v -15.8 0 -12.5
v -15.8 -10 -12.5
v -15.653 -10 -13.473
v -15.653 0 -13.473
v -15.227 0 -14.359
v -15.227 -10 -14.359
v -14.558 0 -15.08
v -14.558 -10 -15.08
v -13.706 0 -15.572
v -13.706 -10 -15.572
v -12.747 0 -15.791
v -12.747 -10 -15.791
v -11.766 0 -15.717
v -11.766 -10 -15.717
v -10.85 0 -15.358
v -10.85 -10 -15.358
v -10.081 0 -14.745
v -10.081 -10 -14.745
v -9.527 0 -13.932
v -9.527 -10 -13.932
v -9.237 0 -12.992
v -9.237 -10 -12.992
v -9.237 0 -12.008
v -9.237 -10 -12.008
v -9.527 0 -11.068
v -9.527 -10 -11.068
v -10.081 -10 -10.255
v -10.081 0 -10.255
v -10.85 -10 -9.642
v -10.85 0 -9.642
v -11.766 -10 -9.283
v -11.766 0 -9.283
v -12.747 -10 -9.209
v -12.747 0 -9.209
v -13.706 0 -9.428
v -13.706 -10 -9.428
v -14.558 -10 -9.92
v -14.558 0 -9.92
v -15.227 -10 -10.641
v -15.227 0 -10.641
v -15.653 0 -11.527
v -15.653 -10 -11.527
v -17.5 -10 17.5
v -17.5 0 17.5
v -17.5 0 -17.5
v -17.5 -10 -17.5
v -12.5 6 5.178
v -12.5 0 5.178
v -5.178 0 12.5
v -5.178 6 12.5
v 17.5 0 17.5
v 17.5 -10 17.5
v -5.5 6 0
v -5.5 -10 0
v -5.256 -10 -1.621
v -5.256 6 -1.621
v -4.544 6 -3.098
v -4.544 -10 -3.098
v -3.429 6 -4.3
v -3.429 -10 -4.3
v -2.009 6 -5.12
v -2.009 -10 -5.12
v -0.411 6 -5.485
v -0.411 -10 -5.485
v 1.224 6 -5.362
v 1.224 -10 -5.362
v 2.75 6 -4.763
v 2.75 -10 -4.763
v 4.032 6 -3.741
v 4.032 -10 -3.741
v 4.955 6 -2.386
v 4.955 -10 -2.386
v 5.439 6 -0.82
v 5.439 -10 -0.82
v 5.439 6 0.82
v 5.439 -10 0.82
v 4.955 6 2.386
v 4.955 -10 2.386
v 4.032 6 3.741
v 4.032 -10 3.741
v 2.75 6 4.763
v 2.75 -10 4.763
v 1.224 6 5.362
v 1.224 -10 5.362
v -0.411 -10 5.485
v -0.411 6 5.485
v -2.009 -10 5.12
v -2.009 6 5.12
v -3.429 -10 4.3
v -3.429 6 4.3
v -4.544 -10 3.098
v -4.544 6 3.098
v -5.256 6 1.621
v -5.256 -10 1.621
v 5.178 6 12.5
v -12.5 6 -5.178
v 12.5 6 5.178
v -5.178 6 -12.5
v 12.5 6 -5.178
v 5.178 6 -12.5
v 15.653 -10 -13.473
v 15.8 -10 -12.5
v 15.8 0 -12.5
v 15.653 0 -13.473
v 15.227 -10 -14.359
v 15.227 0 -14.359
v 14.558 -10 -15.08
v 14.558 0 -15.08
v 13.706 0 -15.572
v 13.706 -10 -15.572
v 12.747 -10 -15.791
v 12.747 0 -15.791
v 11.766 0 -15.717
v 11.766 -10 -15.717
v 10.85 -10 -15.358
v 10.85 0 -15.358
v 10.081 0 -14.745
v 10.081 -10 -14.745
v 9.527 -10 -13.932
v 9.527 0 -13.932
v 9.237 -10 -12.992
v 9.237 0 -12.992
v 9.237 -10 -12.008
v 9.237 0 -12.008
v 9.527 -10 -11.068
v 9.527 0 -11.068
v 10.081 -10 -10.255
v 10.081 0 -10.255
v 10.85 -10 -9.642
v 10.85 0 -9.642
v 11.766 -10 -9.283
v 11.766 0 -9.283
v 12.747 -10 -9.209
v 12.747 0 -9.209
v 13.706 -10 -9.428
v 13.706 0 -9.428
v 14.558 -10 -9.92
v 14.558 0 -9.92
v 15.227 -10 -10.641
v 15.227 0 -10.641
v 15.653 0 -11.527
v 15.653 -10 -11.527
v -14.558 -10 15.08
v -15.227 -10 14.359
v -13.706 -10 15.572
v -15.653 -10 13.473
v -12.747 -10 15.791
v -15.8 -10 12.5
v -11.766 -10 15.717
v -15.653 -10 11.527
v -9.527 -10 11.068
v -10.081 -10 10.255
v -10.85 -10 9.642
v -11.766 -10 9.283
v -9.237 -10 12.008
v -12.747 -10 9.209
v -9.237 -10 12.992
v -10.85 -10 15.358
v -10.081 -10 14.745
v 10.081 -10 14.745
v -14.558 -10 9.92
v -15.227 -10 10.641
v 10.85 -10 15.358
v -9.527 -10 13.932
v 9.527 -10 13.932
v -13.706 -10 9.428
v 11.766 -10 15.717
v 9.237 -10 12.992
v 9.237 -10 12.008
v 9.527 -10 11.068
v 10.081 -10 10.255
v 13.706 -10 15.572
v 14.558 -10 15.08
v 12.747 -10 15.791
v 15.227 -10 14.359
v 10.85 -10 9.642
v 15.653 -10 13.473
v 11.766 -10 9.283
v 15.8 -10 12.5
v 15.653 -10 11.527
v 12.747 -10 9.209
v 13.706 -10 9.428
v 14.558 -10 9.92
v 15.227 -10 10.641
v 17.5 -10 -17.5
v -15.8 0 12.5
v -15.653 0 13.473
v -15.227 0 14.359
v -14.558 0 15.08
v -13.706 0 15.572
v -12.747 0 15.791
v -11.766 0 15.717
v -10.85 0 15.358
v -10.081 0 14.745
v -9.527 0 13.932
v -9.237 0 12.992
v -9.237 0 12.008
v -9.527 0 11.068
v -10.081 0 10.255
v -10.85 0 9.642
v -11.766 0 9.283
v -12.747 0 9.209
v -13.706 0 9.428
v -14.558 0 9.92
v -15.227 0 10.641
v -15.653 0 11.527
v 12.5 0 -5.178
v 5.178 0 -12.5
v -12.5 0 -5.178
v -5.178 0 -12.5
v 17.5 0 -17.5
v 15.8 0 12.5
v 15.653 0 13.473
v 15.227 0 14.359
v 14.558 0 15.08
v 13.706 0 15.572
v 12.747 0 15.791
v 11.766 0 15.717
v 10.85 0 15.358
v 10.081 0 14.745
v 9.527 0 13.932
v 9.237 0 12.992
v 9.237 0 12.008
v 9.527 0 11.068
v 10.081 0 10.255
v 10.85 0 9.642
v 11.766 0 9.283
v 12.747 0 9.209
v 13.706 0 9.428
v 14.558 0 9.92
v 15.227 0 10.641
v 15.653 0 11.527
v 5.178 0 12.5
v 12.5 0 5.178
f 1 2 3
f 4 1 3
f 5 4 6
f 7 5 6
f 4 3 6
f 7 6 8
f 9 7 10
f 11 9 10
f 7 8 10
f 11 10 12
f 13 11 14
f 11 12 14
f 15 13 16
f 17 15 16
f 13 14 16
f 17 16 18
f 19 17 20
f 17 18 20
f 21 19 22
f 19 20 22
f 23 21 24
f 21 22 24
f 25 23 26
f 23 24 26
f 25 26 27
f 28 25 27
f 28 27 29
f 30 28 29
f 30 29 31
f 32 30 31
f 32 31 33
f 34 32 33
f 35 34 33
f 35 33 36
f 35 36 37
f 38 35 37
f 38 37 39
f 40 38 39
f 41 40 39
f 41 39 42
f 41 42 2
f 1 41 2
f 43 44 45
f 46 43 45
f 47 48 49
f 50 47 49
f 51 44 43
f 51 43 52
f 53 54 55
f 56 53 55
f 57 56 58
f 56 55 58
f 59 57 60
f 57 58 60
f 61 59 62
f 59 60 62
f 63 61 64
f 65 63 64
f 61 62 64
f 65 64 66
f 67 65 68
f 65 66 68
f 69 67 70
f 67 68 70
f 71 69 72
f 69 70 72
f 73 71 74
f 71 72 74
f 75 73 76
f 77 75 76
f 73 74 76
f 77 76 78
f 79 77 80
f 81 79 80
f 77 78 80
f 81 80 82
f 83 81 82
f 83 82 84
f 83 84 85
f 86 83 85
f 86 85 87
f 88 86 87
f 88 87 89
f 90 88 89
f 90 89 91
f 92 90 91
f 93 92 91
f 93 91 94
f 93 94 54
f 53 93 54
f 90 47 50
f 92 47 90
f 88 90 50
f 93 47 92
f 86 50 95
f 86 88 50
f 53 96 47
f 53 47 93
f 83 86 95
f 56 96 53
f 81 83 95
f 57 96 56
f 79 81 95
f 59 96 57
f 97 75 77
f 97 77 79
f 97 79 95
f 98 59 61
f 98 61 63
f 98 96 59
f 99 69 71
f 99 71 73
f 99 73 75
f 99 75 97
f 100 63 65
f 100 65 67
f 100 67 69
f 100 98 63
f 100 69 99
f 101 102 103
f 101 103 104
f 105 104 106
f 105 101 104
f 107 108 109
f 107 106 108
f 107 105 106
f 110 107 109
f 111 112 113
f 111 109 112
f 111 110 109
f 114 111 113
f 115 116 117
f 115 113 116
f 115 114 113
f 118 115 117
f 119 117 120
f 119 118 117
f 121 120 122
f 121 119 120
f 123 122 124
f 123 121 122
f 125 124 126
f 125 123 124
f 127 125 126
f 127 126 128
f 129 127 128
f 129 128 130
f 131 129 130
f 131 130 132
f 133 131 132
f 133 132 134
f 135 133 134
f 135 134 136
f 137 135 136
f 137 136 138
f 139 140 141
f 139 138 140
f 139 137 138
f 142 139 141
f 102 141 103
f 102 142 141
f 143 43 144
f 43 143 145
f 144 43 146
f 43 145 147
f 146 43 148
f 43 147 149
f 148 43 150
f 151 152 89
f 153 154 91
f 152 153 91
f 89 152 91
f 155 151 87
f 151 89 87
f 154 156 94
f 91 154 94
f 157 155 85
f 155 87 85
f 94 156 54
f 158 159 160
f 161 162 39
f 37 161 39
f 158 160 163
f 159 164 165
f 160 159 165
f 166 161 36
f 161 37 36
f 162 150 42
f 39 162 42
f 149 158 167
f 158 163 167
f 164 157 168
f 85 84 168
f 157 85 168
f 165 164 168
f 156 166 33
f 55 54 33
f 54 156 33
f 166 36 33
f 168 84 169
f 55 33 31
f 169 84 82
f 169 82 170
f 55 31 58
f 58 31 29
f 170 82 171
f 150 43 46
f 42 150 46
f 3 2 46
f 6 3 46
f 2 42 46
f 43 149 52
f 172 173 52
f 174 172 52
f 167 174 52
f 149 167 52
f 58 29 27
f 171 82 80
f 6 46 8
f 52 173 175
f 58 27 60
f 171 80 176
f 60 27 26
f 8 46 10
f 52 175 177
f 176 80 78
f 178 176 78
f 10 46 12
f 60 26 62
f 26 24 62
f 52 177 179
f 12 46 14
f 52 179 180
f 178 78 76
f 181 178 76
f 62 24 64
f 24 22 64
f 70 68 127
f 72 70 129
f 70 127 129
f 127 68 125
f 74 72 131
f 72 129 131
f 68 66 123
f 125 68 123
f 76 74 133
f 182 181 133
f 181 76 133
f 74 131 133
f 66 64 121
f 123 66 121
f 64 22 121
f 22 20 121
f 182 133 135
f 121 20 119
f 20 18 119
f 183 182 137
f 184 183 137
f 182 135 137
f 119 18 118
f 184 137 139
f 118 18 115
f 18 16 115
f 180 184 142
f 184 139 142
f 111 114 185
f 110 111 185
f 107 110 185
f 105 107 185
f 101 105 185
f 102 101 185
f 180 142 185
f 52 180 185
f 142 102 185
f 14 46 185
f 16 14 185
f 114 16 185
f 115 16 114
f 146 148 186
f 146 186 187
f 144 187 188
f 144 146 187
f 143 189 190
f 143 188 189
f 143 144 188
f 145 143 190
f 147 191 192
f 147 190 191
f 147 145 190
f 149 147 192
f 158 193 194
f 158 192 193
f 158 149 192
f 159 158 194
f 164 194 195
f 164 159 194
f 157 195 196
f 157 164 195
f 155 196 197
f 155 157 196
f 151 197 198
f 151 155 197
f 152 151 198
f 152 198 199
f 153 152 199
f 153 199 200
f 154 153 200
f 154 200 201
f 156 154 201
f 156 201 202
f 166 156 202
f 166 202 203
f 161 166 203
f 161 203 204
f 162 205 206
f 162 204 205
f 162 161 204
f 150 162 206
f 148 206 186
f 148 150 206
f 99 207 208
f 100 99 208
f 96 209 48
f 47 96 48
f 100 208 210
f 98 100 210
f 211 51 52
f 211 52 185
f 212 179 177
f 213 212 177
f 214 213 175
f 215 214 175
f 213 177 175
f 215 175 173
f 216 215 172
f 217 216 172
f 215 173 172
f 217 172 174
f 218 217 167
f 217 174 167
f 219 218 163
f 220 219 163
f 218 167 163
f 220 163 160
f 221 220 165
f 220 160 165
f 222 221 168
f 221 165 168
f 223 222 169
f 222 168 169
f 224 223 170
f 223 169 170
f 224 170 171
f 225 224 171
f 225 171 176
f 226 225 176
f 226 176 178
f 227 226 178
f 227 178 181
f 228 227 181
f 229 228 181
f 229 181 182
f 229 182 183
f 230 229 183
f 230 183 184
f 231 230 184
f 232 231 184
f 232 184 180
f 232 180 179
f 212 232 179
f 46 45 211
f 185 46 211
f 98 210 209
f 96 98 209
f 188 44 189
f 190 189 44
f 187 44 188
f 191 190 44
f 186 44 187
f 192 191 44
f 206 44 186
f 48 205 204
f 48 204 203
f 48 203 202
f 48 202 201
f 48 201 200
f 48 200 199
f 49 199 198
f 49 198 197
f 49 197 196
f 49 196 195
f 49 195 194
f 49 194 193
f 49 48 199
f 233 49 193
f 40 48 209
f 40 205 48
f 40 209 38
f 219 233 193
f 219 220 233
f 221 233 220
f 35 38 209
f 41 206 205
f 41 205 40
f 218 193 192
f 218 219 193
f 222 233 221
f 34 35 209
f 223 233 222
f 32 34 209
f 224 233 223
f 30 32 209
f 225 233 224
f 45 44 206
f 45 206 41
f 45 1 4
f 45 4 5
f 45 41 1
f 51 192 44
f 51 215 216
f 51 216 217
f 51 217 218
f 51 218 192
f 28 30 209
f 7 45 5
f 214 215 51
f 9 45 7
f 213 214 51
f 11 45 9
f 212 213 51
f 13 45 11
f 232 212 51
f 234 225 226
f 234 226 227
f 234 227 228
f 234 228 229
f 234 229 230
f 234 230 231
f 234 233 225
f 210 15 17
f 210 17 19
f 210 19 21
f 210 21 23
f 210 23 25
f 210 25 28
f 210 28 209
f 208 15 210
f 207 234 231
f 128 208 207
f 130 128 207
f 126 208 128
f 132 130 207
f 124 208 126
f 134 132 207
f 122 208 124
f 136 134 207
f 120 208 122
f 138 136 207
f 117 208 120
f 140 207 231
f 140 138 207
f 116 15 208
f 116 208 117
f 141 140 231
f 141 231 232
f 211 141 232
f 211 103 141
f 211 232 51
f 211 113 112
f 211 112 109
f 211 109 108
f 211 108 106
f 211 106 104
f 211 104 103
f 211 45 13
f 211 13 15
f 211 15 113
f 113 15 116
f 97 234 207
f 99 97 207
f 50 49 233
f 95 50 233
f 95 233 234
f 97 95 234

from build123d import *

# Parameters (mm, degrees)
SKETCH1_W             = 35
SKETCH1_H             = 35
BOSS_EXTRUDE1_DEPTH   = 10
BOSS_EXTRUDE2_DEPTH   = 6
M10_CLEARANCE_HOLE1_D = 11
M6_CLEARANCE_HOLE1_D  = 6.6
MIRROR2_COPY_1_D      = 6.6
MIRROR2_COPY_2_D      = 6.6


with BuildPart() as part:
    # Sketch1 → Boss-Extrude1 (new body)
    with BuildSketch(Plane(origin=(0, 0, 0), x_dir=(1, 0, 0), z_dir=(0, 1, 0))):
        Rectangle(SKETCH1_W, SKETCH1_H)
    extrude(amount=-BOSS_EXTRUDE1_DEPTH)

    # Sketch1<3> → Boss-Extrude2 (add)
    with BuildSketch(Plane(origin=(0, 0, 0), x_dir=(1, 0, 0), z_dir=(0, 1, 0))):
        Polygon((-5.17766953, -12.5), (5.17766953, -12.5), (12.5, -5.17766953), (12.5, 5.17766953), (5.17766953, 12.5), (-5.17766953, 12.5), (-12.5, 5.17766953), (-12.5, -5.17766953), align=None)
    extrude(amount=BOSS_EXTRUDE2_DEPTH)

    # M10 Clearance Hole1 (through all)
    with Locations(Plane(origin=(0, 6, 0), x_dir=(1, 0, 0), z_dir=(0, 1, 0))):
        with Locations((0, 0)):
            Hole(M10_CLEARANCE_HOLE1_D / 2)

    # M6 Clearance Hole1 (through all)
    with Locations(Plane(origin=(0, 0, 0), x_dir=(1, 0, 0), z_dir=(0, 1, 0))):
        with Locations((-12.5, 12.5)):
            m6_clearance_hole1 = Hole(M6_CLEARANCE_HOLE1_D / 2)

    # Mirror1: M6 Clearance Hole1 across plane
    add(m6_clearance_hole1.mirror(Plane(origin=(0, 0, 0), x_dir=(0, 0, 1), z_dir=(1, 0, 0))), mode=Mode.SUBTRACT)

    # Mirror2 copy 1 (through all)
    with Locations(Plane(origin=(0, 0, 0), x_dir=(-1, 0, 0), z_dir=(0, 1, 0))):
        with Locations((-12.5, 12.5)):
            Hole(MIRROR2_COPY_1_D / 2)

    # Mirror2 copy 2 (through all)
    with Locations(Plane(origin=(0, 0, 0), x_dir=(1, 0, 0), z_dir=(0, 1, 0))):
        with Locations((-12.5, -12.5)):
            Hole(MIRROR2_COPY_2_D / 2)


solid = part.part
